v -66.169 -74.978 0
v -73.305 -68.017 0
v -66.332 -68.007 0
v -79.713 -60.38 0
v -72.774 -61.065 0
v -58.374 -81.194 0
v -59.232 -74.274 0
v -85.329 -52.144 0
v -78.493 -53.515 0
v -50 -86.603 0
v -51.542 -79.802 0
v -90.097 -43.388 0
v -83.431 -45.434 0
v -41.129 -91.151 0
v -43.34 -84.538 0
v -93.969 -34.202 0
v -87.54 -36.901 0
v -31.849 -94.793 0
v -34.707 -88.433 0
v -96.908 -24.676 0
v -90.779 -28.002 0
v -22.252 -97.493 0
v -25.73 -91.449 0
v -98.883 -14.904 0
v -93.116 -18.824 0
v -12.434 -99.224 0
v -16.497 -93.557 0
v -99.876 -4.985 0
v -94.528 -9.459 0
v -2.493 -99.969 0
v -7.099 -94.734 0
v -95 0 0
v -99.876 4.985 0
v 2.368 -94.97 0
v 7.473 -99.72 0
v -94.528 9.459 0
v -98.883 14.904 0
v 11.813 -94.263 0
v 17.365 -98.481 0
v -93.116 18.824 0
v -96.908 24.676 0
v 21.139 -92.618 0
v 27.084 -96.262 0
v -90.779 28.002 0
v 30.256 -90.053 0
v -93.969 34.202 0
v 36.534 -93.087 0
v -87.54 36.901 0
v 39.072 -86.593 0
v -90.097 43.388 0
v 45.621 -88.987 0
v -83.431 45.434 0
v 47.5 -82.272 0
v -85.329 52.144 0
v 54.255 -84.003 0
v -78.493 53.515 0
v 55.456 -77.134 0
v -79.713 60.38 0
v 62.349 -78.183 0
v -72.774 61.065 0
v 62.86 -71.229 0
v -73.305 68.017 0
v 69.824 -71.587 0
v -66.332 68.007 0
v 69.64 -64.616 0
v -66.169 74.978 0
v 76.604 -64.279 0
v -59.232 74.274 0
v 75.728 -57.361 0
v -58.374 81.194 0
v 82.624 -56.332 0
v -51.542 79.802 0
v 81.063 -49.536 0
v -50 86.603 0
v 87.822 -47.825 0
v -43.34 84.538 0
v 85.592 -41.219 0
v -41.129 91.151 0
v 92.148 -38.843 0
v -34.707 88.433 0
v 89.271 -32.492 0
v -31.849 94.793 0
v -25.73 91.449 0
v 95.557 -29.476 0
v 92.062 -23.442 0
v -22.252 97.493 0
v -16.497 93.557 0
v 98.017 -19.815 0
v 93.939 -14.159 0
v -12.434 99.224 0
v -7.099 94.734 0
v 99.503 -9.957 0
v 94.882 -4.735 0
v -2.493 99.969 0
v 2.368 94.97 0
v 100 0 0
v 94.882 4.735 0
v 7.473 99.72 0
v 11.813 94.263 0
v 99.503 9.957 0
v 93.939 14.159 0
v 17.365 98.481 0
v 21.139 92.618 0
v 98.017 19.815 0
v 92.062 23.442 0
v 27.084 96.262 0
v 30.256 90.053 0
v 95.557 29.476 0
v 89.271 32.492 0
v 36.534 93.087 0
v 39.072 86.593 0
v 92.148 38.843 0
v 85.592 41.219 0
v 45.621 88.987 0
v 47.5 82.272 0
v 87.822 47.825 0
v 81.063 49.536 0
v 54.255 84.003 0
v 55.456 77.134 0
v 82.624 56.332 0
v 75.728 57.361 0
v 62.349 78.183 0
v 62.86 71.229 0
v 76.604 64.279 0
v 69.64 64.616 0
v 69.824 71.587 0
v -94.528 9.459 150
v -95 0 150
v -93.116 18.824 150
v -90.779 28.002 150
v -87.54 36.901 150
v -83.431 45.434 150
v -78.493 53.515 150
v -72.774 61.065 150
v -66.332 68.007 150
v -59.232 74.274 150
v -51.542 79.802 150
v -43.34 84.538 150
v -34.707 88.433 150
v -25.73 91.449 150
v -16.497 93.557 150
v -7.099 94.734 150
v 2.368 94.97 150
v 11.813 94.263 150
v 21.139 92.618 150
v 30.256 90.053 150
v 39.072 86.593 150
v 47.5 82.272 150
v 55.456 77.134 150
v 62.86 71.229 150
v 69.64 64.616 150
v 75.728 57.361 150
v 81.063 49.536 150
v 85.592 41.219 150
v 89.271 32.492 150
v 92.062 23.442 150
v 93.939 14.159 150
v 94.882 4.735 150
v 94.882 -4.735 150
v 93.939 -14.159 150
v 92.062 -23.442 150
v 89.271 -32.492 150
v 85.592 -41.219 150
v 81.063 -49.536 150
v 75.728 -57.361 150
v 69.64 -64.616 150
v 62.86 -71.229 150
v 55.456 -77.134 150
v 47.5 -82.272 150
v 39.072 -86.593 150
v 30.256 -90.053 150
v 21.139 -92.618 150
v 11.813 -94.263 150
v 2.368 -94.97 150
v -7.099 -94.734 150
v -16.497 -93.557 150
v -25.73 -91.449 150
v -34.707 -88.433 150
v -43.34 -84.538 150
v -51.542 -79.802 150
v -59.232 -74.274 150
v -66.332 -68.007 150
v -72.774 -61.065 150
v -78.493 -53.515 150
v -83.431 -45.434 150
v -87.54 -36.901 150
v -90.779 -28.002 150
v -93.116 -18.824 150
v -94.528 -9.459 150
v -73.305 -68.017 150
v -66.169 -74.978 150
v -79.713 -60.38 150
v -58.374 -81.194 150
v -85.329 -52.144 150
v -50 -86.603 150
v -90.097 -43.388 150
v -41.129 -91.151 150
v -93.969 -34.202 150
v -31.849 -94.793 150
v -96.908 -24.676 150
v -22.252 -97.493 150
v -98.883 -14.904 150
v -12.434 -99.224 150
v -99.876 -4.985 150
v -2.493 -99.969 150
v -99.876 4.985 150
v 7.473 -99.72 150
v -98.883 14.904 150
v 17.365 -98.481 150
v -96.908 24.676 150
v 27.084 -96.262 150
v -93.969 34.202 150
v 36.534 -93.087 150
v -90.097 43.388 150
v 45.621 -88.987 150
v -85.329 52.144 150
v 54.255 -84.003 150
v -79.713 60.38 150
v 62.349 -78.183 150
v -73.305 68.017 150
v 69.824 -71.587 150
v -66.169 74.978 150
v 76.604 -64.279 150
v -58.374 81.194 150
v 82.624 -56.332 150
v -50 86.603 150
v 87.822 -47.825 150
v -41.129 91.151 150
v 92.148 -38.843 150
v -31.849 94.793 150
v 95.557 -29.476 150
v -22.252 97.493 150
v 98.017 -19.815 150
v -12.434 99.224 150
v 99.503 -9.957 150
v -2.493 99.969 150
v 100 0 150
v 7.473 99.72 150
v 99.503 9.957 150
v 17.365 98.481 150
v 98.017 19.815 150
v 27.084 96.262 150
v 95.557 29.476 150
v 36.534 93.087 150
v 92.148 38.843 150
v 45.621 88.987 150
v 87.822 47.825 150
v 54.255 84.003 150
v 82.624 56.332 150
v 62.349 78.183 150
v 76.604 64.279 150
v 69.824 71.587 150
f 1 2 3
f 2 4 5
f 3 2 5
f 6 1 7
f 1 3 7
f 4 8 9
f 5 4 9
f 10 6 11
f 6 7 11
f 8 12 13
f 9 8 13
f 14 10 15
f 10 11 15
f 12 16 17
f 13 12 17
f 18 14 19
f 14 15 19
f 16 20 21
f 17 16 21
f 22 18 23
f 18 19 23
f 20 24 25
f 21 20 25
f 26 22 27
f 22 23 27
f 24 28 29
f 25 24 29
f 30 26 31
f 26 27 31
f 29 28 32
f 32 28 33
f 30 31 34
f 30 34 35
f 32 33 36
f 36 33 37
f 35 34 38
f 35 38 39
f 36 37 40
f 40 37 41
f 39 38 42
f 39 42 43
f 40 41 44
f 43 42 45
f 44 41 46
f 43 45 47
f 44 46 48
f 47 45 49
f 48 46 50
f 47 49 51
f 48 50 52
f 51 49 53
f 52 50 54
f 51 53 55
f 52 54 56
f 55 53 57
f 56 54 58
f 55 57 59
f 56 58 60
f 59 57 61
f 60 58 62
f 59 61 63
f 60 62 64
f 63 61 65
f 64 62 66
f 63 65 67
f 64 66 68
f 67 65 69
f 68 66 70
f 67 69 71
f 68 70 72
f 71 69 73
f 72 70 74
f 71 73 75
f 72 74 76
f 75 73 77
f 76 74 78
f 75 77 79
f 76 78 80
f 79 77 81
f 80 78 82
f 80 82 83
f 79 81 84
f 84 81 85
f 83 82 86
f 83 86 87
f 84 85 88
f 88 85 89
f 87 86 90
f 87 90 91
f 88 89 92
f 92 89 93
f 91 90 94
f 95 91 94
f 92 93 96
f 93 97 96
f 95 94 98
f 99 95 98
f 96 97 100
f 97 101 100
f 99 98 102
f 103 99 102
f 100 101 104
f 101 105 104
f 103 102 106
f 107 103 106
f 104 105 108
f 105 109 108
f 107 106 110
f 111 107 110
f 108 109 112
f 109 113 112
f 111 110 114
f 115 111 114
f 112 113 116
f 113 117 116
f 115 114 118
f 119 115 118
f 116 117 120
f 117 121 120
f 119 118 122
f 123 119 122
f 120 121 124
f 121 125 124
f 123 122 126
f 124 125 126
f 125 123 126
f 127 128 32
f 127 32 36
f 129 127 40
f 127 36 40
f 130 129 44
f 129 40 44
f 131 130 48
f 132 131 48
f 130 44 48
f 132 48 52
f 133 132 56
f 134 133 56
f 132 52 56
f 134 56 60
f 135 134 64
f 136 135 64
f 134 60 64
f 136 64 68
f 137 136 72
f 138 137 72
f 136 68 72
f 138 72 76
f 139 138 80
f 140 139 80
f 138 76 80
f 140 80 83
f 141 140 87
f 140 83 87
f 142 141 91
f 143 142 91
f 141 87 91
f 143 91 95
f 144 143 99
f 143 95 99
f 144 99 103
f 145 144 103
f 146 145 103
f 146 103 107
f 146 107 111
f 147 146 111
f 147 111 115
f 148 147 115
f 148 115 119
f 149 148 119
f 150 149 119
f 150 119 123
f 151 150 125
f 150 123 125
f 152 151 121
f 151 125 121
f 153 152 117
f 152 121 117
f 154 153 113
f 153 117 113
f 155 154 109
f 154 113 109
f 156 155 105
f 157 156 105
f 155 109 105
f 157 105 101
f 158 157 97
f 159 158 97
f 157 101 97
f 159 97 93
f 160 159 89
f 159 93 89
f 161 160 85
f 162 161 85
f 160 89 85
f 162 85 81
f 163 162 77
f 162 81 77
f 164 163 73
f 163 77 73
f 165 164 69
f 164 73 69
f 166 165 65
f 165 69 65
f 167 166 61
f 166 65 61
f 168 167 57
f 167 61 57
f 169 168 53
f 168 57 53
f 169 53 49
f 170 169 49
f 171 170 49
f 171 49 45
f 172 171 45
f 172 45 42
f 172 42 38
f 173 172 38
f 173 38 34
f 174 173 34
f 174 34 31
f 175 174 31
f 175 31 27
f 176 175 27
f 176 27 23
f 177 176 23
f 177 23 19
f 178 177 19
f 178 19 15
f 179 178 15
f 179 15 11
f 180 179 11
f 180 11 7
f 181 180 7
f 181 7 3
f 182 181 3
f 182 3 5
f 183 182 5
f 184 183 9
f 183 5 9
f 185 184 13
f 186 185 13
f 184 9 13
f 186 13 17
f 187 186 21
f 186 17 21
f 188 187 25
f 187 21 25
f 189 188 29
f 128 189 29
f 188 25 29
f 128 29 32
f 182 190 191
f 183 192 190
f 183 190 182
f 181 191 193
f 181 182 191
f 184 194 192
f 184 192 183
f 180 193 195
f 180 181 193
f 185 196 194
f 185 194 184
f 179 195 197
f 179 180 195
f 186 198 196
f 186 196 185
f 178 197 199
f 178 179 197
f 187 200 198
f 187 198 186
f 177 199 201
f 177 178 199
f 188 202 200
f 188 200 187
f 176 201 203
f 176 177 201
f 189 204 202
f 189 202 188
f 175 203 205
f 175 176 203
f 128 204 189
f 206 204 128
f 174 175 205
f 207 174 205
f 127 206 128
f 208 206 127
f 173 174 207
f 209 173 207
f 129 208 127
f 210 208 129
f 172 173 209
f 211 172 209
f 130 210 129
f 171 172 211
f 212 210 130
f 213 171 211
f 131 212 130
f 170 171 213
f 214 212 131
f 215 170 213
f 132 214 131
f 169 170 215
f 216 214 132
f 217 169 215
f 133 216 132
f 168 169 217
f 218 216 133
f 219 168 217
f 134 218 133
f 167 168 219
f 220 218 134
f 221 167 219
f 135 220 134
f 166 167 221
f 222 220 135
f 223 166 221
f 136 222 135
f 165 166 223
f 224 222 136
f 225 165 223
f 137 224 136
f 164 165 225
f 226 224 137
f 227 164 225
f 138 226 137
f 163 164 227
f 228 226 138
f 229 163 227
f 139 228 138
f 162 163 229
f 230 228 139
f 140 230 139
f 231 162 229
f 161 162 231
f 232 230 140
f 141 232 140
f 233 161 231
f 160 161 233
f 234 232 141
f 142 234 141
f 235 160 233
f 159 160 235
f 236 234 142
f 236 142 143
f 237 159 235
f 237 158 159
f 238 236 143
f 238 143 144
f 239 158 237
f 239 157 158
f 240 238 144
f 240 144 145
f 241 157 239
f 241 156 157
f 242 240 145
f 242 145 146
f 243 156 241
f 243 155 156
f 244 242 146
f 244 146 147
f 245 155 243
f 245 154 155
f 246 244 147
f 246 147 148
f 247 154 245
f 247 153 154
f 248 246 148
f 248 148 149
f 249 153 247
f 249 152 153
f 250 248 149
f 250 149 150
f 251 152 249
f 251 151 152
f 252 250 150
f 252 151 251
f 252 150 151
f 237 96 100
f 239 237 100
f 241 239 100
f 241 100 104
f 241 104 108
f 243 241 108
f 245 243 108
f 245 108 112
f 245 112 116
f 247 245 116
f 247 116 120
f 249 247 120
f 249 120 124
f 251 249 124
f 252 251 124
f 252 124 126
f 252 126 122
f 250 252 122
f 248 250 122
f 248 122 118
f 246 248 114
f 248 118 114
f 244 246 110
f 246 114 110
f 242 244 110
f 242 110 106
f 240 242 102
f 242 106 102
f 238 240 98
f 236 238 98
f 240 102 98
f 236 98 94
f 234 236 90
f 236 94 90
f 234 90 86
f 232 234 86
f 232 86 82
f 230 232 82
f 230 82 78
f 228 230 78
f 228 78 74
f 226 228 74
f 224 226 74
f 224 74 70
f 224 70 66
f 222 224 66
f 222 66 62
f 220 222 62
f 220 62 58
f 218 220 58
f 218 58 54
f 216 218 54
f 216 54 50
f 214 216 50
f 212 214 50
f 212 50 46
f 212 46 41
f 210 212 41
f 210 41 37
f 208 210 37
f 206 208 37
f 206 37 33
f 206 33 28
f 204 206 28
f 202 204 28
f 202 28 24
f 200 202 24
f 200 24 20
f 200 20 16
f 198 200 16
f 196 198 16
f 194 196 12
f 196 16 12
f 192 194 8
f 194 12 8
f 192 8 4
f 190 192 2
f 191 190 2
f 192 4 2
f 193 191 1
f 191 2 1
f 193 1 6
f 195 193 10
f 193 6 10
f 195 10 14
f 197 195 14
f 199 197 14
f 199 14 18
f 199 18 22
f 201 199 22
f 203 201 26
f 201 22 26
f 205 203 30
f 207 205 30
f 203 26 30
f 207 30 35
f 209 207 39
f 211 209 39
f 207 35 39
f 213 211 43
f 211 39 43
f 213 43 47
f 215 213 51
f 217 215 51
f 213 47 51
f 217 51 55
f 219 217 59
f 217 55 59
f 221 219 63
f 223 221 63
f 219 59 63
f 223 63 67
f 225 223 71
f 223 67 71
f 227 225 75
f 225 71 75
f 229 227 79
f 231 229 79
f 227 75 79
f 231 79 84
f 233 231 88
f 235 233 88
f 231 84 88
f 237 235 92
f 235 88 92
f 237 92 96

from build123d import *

# Parameters (mm, degrees)
SKETCH1_R           = 100
BOSS_EXTRUDE1_DEPTH = 160
SKETCH2_R           = 95
CUT_EXTRUDE1_DEPTH  = 150
SKETCH3_R           = 10
CUT_EXTRUDE2_DEPTH  = 150
CUT_EXTRUDE4_START  = -10
SKETCH8_R           = 100
CUT_EXTRUDE4_DEPTH  = 10


with BuildPart() as part:
    # Sketch1 → Boss-Extrude1 (new body)
    with BuildSketch(Plane.XY):
        Circle(SKETCH1_R)
    extrude(amount=BOSS_EXTRUDE1_DEPTH)

    # Sketch2 → Cut-Extrude1 (cut)
    with BuildSketch(Plane(origin=(0, 0, 0), x_dir=(-1, 0, 0), z_dir=(0, 0, -1))):
        Circle(SKETCH2_R)
    extrude(amount=-CUT_EXTRUDE1_DEPTH, mode=Mode.SUBTRACT)

    # Sketch3 → Cut-Extrude2 (cut)
    with BuildSketch(Plane.XY.offset(160)):
        Circle(SKETCH3_R)
    extrude(amount=-CUT_EXTRUDE2_DEPTH, mode=Mode.SUBTRACT)

    # Sketch8 → Cut-Extrude4 (cut)
    with BuildSketch(Plane.XY.offset(160).offset(CUT_EXTRUDE4_START)):
        Circle(SKETCH8_R)
    extrude(amount=CUT_EXTRUDE4_DEPTH, mode=Mode.SUBTRACT)


solid = part.part
